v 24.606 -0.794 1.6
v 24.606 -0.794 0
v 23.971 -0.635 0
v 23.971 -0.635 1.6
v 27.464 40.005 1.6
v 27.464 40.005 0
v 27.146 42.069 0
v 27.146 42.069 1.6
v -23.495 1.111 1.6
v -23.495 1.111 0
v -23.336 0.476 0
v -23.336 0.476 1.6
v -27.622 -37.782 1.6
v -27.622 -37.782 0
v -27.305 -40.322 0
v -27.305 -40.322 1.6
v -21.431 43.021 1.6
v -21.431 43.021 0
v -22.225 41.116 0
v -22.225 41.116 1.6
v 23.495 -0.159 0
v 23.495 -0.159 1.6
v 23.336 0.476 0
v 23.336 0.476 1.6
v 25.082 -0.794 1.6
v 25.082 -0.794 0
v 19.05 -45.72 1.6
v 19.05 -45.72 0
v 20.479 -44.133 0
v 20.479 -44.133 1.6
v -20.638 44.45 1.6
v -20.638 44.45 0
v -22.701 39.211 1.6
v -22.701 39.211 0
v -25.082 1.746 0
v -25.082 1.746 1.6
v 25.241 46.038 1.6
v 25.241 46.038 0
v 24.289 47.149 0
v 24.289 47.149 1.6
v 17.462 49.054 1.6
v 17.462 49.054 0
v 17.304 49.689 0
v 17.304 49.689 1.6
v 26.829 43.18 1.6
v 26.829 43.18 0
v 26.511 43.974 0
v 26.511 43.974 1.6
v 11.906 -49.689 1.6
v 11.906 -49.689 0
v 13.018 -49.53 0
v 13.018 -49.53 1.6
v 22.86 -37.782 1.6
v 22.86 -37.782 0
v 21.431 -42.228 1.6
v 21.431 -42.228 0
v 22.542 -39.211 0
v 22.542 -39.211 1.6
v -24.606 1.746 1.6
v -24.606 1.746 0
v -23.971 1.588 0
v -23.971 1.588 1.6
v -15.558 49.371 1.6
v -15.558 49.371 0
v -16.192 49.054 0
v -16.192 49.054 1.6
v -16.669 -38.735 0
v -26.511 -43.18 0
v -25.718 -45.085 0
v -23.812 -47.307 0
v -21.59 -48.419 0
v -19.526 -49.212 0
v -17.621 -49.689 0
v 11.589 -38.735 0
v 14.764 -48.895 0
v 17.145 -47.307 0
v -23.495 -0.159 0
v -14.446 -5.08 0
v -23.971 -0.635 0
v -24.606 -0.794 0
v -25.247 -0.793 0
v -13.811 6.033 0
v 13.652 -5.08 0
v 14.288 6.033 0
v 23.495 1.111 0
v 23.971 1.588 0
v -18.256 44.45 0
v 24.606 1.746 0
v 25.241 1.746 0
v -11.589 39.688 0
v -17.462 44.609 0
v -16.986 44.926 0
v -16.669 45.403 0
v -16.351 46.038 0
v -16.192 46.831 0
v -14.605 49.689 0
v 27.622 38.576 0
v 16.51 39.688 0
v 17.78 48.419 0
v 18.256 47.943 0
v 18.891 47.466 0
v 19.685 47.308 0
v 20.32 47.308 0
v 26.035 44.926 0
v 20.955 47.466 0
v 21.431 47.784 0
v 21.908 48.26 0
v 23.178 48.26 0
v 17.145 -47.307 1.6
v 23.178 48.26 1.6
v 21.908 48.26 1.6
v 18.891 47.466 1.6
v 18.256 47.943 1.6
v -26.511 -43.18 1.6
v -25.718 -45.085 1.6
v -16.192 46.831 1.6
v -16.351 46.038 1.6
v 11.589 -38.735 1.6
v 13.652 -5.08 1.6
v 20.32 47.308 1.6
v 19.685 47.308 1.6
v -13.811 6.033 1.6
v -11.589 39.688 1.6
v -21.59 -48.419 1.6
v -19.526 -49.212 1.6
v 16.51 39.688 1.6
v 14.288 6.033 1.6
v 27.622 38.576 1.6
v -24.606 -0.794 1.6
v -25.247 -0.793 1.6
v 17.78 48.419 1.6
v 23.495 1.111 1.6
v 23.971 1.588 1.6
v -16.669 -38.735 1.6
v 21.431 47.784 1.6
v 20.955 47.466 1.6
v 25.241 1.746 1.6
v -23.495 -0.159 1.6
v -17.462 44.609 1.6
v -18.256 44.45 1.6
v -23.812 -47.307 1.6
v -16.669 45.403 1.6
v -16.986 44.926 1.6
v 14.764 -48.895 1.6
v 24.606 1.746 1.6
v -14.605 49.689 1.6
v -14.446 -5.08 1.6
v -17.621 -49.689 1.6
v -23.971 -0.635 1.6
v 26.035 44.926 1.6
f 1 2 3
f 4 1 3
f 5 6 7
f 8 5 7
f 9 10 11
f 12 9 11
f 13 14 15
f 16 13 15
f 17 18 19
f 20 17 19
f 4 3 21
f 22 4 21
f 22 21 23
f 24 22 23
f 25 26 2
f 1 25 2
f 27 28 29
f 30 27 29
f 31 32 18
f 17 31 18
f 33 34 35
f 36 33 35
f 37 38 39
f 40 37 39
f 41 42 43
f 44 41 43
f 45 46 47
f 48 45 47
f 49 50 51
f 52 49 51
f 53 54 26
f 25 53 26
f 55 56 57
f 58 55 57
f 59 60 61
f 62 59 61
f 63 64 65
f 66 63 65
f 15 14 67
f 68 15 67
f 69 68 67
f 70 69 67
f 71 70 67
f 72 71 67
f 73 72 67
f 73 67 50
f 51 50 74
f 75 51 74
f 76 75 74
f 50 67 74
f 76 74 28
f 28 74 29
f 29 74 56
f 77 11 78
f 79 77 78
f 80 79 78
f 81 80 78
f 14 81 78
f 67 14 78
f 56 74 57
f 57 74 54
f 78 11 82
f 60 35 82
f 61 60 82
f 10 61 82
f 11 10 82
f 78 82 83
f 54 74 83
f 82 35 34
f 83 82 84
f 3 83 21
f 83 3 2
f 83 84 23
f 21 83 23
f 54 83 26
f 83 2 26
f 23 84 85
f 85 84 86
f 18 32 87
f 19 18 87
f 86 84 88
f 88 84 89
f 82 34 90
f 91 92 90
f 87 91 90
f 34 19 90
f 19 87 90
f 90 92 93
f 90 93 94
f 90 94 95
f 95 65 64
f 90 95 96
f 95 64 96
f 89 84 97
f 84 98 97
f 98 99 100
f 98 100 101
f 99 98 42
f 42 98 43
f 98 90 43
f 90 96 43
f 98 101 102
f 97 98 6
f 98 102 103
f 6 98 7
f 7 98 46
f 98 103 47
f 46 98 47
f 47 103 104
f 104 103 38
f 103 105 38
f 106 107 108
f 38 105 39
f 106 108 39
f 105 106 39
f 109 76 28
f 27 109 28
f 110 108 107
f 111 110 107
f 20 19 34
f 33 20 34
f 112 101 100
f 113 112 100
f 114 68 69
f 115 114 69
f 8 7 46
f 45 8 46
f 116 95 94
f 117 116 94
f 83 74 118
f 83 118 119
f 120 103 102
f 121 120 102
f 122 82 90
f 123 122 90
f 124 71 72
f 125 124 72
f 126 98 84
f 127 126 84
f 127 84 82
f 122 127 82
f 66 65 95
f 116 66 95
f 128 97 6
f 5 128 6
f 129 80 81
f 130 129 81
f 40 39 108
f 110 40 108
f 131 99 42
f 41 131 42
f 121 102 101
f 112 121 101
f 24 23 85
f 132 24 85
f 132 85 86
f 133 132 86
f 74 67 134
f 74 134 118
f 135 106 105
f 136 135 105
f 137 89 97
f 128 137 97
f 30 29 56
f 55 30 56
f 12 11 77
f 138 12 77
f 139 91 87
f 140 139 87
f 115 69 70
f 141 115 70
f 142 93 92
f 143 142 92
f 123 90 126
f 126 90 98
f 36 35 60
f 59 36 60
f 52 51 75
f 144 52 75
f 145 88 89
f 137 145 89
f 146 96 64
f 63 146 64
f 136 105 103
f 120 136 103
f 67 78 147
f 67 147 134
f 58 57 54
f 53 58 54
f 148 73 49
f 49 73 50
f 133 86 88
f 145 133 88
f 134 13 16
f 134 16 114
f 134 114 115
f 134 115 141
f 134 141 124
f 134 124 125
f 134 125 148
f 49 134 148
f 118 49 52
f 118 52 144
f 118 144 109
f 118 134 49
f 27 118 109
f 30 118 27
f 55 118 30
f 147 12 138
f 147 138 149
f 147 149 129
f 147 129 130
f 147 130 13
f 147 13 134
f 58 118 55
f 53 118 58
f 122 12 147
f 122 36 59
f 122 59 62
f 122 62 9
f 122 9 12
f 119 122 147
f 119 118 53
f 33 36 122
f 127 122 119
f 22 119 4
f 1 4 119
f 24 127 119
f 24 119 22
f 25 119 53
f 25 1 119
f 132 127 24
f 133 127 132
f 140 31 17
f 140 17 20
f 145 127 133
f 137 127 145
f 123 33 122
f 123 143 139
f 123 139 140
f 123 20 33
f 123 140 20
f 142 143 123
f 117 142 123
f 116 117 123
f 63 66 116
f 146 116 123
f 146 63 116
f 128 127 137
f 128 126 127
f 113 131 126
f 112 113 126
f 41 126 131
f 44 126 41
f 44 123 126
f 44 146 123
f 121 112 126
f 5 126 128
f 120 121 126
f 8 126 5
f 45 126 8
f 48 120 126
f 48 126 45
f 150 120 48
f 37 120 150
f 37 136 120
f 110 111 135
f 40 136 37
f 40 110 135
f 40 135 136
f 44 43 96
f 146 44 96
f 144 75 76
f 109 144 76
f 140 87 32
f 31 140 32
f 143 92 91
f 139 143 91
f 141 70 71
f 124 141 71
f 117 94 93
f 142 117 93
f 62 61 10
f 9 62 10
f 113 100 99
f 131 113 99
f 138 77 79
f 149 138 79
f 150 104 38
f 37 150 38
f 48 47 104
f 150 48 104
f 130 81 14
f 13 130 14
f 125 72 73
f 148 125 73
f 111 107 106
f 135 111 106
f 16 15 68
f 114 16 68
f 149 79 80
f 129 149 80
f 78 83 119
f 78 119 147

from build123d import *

# Parameters (mm, degrees)
AUFSATZ_LINEAR_AUSTRAGEN1_DEPTH = 1.6


with BuildPart() as part:
    # Skizze1 → Aufsatz-Linear austragen1 (new body)
    with BuildSketch(Plane.XY):
        Polygon((17.145, -47.307483333), (19.05, -45.720016667), (20.478733333, -44.132516667), (21.431266667, -42.227516667), (22.5425, -39.21125), (22.86, -37.782483333), (25.0825, -0.79375), (24.60625, -0.79375), (23.97125, -0.635), (23.495, -0.15875), (23.33625, 0.47625), (23.495, 1.11125), (23.97125, 1.5875), (24.60625, 1.74625), (25.24125, 1.74625), (27.6225, 38.57625), (27.463733333, 40.004983333), (27.146266667, 42.06875), (26.828733333, 43.180016667), (26.511266667, 43.97375), (26.035, 44.92625), (25.241266667, 46.037516667), (24.288766667, 47.14875), (23.1775, 48.259983333), (21.9075, 48.259983333), (21.431266667, 47.78375), (20.955, 47.46625), (20.32, 47.307516667), (19.685, 47.307516667), (18.891266667, 47.46625), (18.256266667, 47.942516667), (17.78, 48.41875), (17.4625, 49.05375), (17.303733333, 49.68875), (12.7, 49.68875), (-14.605, 49.68875), (-15.5575, 49.37125), (-16.1925, 49.05375), (-16.1925, 46.83125), (-16.351266667, 46.037516667), (-16.668733333, 45.402516667), (-16.986266667, 44.92625), (-17.4625, 44.60875), (-18.256266667, 44.450016667), (-20.6375, 44.450016667), (-21.431266667, 43.02125), (-22.225, 41.11625), (-22.701266667, 39.21125), (-25.0825, 1.74625), (-24.606266667, 1.74625), (-23.971266667, 1.587516667), (-23.495, 1.11125), (-23.336266667, 0.47625), (-23.495, -0.15875), (-23.971266667, -0.635016667), (-24.606266667, -0.79375), (-25.247066667, -0.793383333), (-27.6225, -37.782483333), (-27.305, -40.322483333), (-26.511266667, -43.180016667), (-25.7175, -45.085016667), (-23.8125, -47.307483333), (-21.59, -48.41875), (-19.526266667, -49.212483333), (-17.621266667, -49.68875), (11.906266667, -49.68875), (13.0175, -49.530016667), (14.763733333, -48.895016667), align=None)
        Polygon((13.6525, -5.080016667), (-14.446266667, -5.080016667), (-16.668733333, -38.735016667), (11.588733333, -38.735016667), align=None, mode=Mode.SUBTRACT)
        Polygon((-13.811266667, 6.032516667), (-11.588733333, 39.687516667), (16.51, 39.687516667), (14.2875, 6.032516667), align=None, mode=Mode.SUBTRACT)
    extrude(amount=AUFSATZ_LINEAR_AUSTRAGEN1_DEPTH)


solid = part.part
